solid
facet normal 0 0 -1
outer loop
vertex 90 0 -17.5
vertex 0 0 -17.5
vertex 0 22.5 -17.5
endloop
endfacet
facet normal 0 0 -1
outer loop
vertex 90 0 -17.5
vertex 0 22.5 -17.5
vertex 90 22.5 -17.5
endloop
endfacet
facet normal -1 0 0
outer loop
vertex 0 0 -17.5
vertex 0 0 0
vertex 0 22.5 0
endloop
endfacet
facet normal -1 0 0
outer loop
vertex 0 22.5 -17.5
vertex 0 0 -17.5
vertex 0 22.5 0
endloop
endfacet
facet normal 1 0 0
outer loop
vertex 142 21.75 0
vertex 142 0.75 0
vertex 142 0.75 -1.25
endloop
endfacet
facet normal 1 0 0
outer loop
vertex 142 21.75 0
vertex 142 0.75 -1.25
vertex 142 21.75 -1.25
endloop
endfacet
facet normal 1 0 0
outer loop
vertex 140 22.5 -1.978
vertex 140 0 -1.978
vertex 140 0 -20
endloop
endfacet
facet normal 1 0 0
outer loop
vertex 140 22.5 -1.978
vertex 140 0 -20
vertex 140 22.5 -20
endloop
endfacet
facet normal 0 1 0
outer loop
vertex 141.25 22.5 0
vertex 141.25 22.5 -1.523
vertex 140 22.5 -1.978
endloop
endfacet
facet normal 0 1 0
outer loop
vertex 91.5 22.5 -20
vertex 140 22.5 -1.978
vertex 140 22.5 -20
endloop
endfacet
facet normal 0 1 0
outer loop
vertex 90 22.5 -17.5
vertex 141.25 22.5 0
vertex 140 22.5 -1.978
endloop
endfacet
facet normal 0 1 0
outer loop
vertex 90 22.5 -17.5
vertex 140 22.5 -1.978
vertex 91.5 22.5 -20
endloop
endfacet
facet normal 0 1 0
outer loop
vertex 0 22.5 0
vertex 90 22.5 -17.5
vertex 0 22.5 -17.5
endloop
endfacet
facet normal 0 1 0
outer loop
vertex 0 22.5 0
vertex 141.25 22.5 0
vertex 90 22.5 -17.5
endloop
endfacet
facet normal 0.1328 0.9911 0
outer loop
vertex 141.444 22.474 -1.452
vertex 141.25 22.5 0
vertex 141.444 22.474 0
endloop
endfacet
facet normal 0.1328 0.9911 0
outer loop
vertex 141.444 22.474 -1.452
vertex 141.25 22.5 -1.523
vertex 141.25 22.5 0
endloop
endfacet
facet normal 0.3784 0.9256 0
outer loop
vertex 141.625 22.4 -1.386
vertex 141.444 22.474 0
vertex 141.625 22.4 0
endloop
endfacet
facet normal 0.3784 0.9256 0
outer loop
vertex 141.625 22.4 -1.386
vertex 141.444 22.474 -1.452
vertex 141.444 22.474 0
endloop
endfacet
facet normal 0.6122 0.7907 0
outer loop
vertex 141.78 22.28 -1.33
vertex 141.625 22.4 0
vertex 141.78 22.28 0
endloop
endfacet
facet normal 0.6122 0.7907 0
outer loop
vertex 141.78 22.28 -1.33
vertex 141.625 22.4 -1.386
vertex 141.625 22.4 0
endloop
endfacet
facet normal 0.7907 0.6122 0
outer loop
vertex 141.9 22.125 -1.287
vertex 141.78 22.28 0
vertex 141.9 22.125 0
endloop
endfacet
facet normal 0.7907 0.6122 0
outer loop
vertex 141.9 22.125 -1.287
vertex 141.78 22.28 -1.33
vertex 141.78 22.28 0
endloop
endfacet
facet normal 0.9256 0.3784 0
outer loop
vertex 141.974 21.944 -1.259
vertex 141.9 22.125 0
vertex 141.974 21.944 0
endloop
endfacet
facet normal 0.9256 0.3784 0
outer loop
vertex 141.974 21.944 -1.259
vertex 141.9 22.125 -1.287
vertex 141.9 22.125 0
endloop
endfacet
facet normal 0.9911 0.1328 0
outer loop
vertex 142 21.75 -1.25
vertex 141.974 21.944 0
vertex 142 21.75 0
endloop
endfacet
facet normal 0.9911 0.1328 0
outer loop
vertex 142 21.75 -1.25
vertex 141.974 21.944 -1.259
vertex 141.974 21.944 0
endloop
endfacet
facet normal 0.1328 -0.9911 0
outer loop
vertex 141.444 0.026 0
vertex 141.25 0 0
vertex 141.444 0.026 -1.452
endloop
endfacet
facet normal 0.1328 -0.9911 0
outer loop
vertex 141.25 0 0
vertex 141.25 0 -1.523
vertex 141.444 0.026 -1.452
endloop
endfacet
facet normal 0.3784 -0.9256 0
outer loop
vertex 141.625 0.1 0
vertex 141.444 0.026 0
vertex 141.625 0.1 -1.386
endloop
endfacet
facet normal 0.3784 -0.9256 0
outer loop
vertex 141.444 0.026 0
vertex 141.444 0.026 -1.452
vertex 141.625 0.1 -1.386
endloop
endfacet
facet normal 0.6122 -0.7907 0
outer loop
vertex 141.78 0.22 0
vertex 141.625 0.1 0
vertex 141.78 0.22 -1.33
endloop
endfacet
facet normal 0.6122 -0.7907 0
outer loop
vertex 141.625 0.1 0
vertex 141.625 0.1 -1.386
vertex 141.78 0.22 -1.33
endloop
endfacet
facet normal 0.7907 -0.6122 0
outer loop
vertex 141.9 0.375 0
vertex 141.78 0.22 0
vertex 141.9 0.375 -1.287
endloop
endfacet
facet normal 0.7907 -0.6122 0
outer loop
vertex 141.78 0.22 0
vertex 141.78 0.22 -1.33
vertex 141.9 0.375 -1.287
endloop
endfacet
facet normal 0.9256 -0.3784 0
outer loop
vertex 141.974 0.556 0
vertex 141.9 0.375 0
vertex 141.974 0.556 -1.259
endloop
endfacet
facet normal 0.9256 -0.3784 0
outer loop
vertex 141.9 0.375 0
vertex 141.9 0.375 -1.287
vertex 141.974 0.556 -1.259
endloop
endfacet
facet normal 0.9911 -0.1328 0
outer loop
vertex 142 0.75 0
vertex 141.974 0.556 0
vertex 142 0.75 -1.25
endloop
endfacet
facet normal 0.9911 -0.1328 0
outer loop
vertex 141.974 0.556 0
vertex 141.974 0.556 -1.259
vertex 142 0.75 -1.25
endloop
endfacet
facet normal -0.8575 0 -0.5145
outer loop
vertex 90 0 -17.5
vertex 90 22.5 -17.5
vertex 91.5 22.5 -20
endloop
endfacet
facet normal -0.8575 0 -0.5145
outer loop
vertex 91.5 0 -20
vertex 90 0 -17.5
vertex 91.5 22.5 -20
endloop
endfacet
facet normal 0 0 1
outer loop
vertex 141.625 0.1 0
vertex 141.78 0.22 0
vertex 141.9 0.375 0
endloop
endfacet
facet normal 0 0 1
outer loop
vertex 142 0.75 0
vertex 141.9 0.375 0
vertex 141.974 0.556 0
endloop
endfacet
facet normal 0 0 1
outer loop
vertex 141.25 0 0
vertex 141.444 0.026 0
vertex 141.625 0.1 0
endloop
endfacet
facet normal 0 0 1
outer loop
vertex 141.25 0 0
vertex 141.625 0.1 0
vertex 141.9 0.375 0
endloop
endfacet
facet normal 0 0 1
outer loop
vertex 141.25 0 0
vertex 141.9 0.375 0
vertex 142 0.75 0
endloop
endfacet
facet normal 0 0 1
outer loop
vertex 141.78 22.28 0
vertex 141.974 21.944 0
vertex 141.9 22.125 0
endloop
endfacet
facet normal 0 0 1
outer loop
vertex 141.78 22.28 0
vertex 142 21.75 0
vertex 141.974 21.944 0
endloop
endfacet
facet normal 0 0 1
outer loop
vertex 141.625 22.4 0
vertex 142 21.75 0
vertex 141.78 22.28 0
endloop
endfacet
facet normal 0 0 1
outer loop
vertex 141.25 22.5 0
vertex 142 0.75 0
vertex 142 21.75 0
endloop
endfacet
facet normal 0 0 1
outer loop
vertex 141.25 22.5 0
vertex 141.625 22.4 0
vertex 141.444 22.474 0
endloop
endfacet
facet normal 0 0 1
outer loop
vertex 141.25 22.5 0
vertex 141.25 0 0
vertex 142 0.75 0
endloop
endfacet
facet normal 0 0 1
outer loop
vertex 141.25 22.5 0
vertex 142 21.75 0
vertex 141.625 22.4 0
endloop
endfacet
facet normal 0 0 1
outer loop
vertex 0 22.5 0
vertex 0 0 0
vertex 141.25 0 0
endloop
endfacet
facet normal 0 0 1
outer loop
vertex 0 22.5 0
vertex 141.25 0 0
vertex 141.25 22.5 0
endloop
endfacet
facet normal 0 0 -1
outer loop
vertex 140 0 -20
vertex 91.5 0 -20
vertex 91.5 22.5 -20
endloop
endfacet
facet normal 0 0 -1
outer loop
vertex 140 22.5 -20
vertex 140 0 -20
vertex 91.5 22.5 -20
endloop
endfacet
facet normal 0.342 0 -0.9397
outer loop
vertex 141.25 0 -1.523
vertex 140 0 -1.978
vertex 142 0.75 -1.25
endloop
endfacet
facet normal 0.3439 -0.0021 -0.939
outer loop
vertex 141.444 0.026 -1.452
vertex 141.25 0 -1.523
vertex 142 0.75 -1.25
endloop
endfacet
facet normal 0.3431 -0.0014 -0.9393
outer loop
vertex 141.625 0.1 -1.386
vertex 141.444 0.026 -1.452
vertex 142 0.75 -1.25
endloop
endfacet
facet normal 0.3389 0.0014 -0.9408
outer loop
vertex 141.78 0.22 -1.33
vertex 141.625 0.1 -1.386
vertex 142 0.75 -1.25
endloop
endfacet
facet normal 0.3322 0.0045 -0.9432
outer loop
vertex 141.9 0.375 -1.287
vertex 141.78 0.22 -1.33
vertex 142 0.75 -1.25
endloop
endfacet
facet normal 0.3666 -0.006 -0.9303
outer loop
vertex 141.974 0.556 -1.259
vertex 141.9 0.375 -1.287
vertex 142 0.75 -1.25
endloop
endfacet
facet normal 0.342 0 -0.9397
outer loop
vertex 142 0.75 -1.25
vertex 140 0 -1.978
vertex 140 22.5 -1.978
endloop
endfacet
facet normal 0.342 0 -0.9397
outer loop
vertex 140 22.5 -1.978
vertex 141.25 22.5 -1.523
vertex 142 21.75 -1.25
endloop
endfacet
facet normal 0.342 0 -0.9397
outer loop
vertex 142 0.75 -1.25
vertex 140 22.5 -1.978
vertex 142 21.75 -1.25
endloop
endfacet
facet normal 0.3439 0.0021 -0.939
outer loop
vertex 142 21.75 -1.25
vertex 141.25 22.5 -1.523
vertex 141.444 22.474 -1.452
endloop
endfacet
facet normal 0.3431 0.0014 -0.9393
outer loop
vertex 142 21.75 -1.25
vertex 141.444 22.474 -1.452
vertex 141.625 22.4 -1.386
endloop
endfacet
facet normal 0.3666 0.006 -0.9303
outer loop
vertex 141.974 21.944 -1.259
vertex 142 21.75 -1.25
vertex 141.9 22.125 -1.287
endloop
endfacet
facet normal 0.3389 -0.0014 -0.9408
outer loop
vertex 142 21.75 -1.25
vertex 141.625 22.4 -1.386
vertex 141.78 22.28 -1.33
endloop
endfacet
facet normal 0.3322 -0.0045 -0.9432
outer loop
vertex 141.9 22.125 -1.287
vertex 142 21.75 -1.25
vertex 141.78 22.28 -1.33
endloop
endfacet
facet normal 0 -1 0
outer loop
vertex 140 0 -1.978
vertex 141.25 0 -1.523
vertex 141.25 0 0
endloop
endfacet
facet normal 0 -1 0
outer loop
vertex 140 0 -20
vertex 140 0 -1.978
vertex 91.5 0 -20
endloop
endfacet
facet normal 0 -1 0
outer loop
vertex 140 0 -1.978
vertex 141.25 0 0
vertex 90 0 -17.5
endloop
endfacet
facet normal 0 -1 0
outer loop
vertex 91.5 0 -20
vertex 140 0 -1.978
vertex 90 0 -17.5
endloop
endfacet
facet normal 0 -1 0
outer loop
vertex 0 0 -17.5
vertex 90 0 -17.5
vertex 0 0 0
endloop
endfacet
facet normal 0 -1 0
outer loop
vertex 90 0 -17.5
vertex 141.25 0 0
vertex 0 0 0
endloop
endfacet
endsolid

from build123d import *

# Parameters (mm, degrees)
SKETCH1_W               = 22.5
SKETCH1_H               = 142
BOSS_EXTRUDE1_DEPTH     = 20
SKETCH2_W               = 22.5
SKETCH2_H               = 18
CUT_EXTRUDE1_DEPTH      = 2
CHAMFER5_SIZE           = 2.060608065
CHAMFER5_SIZE_2         = 0.75
FILLET5_R               = 0.75
CUT_EXTRUDE4_DEPTH      = 146.155950619
CUT_EXTRUDE4_DEPTH_BACK = 146.155950619


with BuildPart() as part:
    # Sketch1 → Boss-Extrude1 (new body)
    with BuildSketch(Plane(origin=(0, 0, 0), x_dir=(0, 1, 0), z_dir=(0, 0, 1))):
        with Locations((11.25, -71)):
            Rectangle(SKETCH1_W, SKETCH1_H)
    extrude(amount=-BOSS_EXTRUDE1_DEPTH)

    # Sketch2 → Cut-Extrude1 (cut)
    with BuildSketch(Plane.YZ.offset(142)):
        with Locations((11.25, -11)):
            Rectangle(SKETCH2_W, SKETCH2_H)
    extrude(amount=-CUT_EXTRUDE1_DEPTH, mode=Mode.SUBTRACT)

    # Chamfer5
    # the kernel refuses this chamfer: 2.060608065, 0.75 mm, written as the material it takes off along each edge
    with BuildSketch(Plane(origin=(142, 27.845618587, -2), x_dir=(-0.9999130865277316, 0, -0.013184058198645886), z_dir=(0, -1, 0))) as chamfer5_piece_1_section:
        Polygon((CHAMFER5_SIZE * 0.999913086329, -CHAMFER5_SIZE * 0.013184058196), (-CHAMFER5_SIZE_2 * 0.0131840581986, -CHAMFER5_SIZE_2 * 0.999913086528), (0, 0), align=None)
    chamfer5_piece_1 = extrude(amount=33.191237174, mode=Mode.PRIVATE)
    chamfer5_piece_1 = split(chamfer5_piece_1, bisect_by=Plane(origin=(140, 11.25, -1.766801206), z_dir=(1, 0, 0)), keep=Keep.TOP, mode=Mode.PRIVATE)
    add(chamfer5_piece_1, mode=Mode.SUBTRACT)

    # Fillet5
    fillet5_edges = [part.edges().sort_by_distance(p)[0] for p in [
        (142, 0, -0.625),
        (142, 22.5, -0.625),
    ]]
    fillet(fillet5_edges, radius=FILLET5_R)

    # Sketch6 → Cut-Extrude4 (cut, two sides: drawn at the far end of the back side and taken through both)
    with BuildSketch(Plane(origin=(0, 22.5, 0), x_dir=(-1, 0, 0), z_dir=(0, 1, 0)).offset(-CUT_EXTRUDE4_DEPTH_BACK)):
        Polygon((0, -17.5), (-90, -17.5), (-91.5, -20), (-90, -20), (0, -20), align=None)
    extrude(amount=CUT_EXTRUDE4_DEPTH + CUT_EXTRUDE4_DEPTH_BACK, mode=Mode.SUBTRACT)


solid = part.part
